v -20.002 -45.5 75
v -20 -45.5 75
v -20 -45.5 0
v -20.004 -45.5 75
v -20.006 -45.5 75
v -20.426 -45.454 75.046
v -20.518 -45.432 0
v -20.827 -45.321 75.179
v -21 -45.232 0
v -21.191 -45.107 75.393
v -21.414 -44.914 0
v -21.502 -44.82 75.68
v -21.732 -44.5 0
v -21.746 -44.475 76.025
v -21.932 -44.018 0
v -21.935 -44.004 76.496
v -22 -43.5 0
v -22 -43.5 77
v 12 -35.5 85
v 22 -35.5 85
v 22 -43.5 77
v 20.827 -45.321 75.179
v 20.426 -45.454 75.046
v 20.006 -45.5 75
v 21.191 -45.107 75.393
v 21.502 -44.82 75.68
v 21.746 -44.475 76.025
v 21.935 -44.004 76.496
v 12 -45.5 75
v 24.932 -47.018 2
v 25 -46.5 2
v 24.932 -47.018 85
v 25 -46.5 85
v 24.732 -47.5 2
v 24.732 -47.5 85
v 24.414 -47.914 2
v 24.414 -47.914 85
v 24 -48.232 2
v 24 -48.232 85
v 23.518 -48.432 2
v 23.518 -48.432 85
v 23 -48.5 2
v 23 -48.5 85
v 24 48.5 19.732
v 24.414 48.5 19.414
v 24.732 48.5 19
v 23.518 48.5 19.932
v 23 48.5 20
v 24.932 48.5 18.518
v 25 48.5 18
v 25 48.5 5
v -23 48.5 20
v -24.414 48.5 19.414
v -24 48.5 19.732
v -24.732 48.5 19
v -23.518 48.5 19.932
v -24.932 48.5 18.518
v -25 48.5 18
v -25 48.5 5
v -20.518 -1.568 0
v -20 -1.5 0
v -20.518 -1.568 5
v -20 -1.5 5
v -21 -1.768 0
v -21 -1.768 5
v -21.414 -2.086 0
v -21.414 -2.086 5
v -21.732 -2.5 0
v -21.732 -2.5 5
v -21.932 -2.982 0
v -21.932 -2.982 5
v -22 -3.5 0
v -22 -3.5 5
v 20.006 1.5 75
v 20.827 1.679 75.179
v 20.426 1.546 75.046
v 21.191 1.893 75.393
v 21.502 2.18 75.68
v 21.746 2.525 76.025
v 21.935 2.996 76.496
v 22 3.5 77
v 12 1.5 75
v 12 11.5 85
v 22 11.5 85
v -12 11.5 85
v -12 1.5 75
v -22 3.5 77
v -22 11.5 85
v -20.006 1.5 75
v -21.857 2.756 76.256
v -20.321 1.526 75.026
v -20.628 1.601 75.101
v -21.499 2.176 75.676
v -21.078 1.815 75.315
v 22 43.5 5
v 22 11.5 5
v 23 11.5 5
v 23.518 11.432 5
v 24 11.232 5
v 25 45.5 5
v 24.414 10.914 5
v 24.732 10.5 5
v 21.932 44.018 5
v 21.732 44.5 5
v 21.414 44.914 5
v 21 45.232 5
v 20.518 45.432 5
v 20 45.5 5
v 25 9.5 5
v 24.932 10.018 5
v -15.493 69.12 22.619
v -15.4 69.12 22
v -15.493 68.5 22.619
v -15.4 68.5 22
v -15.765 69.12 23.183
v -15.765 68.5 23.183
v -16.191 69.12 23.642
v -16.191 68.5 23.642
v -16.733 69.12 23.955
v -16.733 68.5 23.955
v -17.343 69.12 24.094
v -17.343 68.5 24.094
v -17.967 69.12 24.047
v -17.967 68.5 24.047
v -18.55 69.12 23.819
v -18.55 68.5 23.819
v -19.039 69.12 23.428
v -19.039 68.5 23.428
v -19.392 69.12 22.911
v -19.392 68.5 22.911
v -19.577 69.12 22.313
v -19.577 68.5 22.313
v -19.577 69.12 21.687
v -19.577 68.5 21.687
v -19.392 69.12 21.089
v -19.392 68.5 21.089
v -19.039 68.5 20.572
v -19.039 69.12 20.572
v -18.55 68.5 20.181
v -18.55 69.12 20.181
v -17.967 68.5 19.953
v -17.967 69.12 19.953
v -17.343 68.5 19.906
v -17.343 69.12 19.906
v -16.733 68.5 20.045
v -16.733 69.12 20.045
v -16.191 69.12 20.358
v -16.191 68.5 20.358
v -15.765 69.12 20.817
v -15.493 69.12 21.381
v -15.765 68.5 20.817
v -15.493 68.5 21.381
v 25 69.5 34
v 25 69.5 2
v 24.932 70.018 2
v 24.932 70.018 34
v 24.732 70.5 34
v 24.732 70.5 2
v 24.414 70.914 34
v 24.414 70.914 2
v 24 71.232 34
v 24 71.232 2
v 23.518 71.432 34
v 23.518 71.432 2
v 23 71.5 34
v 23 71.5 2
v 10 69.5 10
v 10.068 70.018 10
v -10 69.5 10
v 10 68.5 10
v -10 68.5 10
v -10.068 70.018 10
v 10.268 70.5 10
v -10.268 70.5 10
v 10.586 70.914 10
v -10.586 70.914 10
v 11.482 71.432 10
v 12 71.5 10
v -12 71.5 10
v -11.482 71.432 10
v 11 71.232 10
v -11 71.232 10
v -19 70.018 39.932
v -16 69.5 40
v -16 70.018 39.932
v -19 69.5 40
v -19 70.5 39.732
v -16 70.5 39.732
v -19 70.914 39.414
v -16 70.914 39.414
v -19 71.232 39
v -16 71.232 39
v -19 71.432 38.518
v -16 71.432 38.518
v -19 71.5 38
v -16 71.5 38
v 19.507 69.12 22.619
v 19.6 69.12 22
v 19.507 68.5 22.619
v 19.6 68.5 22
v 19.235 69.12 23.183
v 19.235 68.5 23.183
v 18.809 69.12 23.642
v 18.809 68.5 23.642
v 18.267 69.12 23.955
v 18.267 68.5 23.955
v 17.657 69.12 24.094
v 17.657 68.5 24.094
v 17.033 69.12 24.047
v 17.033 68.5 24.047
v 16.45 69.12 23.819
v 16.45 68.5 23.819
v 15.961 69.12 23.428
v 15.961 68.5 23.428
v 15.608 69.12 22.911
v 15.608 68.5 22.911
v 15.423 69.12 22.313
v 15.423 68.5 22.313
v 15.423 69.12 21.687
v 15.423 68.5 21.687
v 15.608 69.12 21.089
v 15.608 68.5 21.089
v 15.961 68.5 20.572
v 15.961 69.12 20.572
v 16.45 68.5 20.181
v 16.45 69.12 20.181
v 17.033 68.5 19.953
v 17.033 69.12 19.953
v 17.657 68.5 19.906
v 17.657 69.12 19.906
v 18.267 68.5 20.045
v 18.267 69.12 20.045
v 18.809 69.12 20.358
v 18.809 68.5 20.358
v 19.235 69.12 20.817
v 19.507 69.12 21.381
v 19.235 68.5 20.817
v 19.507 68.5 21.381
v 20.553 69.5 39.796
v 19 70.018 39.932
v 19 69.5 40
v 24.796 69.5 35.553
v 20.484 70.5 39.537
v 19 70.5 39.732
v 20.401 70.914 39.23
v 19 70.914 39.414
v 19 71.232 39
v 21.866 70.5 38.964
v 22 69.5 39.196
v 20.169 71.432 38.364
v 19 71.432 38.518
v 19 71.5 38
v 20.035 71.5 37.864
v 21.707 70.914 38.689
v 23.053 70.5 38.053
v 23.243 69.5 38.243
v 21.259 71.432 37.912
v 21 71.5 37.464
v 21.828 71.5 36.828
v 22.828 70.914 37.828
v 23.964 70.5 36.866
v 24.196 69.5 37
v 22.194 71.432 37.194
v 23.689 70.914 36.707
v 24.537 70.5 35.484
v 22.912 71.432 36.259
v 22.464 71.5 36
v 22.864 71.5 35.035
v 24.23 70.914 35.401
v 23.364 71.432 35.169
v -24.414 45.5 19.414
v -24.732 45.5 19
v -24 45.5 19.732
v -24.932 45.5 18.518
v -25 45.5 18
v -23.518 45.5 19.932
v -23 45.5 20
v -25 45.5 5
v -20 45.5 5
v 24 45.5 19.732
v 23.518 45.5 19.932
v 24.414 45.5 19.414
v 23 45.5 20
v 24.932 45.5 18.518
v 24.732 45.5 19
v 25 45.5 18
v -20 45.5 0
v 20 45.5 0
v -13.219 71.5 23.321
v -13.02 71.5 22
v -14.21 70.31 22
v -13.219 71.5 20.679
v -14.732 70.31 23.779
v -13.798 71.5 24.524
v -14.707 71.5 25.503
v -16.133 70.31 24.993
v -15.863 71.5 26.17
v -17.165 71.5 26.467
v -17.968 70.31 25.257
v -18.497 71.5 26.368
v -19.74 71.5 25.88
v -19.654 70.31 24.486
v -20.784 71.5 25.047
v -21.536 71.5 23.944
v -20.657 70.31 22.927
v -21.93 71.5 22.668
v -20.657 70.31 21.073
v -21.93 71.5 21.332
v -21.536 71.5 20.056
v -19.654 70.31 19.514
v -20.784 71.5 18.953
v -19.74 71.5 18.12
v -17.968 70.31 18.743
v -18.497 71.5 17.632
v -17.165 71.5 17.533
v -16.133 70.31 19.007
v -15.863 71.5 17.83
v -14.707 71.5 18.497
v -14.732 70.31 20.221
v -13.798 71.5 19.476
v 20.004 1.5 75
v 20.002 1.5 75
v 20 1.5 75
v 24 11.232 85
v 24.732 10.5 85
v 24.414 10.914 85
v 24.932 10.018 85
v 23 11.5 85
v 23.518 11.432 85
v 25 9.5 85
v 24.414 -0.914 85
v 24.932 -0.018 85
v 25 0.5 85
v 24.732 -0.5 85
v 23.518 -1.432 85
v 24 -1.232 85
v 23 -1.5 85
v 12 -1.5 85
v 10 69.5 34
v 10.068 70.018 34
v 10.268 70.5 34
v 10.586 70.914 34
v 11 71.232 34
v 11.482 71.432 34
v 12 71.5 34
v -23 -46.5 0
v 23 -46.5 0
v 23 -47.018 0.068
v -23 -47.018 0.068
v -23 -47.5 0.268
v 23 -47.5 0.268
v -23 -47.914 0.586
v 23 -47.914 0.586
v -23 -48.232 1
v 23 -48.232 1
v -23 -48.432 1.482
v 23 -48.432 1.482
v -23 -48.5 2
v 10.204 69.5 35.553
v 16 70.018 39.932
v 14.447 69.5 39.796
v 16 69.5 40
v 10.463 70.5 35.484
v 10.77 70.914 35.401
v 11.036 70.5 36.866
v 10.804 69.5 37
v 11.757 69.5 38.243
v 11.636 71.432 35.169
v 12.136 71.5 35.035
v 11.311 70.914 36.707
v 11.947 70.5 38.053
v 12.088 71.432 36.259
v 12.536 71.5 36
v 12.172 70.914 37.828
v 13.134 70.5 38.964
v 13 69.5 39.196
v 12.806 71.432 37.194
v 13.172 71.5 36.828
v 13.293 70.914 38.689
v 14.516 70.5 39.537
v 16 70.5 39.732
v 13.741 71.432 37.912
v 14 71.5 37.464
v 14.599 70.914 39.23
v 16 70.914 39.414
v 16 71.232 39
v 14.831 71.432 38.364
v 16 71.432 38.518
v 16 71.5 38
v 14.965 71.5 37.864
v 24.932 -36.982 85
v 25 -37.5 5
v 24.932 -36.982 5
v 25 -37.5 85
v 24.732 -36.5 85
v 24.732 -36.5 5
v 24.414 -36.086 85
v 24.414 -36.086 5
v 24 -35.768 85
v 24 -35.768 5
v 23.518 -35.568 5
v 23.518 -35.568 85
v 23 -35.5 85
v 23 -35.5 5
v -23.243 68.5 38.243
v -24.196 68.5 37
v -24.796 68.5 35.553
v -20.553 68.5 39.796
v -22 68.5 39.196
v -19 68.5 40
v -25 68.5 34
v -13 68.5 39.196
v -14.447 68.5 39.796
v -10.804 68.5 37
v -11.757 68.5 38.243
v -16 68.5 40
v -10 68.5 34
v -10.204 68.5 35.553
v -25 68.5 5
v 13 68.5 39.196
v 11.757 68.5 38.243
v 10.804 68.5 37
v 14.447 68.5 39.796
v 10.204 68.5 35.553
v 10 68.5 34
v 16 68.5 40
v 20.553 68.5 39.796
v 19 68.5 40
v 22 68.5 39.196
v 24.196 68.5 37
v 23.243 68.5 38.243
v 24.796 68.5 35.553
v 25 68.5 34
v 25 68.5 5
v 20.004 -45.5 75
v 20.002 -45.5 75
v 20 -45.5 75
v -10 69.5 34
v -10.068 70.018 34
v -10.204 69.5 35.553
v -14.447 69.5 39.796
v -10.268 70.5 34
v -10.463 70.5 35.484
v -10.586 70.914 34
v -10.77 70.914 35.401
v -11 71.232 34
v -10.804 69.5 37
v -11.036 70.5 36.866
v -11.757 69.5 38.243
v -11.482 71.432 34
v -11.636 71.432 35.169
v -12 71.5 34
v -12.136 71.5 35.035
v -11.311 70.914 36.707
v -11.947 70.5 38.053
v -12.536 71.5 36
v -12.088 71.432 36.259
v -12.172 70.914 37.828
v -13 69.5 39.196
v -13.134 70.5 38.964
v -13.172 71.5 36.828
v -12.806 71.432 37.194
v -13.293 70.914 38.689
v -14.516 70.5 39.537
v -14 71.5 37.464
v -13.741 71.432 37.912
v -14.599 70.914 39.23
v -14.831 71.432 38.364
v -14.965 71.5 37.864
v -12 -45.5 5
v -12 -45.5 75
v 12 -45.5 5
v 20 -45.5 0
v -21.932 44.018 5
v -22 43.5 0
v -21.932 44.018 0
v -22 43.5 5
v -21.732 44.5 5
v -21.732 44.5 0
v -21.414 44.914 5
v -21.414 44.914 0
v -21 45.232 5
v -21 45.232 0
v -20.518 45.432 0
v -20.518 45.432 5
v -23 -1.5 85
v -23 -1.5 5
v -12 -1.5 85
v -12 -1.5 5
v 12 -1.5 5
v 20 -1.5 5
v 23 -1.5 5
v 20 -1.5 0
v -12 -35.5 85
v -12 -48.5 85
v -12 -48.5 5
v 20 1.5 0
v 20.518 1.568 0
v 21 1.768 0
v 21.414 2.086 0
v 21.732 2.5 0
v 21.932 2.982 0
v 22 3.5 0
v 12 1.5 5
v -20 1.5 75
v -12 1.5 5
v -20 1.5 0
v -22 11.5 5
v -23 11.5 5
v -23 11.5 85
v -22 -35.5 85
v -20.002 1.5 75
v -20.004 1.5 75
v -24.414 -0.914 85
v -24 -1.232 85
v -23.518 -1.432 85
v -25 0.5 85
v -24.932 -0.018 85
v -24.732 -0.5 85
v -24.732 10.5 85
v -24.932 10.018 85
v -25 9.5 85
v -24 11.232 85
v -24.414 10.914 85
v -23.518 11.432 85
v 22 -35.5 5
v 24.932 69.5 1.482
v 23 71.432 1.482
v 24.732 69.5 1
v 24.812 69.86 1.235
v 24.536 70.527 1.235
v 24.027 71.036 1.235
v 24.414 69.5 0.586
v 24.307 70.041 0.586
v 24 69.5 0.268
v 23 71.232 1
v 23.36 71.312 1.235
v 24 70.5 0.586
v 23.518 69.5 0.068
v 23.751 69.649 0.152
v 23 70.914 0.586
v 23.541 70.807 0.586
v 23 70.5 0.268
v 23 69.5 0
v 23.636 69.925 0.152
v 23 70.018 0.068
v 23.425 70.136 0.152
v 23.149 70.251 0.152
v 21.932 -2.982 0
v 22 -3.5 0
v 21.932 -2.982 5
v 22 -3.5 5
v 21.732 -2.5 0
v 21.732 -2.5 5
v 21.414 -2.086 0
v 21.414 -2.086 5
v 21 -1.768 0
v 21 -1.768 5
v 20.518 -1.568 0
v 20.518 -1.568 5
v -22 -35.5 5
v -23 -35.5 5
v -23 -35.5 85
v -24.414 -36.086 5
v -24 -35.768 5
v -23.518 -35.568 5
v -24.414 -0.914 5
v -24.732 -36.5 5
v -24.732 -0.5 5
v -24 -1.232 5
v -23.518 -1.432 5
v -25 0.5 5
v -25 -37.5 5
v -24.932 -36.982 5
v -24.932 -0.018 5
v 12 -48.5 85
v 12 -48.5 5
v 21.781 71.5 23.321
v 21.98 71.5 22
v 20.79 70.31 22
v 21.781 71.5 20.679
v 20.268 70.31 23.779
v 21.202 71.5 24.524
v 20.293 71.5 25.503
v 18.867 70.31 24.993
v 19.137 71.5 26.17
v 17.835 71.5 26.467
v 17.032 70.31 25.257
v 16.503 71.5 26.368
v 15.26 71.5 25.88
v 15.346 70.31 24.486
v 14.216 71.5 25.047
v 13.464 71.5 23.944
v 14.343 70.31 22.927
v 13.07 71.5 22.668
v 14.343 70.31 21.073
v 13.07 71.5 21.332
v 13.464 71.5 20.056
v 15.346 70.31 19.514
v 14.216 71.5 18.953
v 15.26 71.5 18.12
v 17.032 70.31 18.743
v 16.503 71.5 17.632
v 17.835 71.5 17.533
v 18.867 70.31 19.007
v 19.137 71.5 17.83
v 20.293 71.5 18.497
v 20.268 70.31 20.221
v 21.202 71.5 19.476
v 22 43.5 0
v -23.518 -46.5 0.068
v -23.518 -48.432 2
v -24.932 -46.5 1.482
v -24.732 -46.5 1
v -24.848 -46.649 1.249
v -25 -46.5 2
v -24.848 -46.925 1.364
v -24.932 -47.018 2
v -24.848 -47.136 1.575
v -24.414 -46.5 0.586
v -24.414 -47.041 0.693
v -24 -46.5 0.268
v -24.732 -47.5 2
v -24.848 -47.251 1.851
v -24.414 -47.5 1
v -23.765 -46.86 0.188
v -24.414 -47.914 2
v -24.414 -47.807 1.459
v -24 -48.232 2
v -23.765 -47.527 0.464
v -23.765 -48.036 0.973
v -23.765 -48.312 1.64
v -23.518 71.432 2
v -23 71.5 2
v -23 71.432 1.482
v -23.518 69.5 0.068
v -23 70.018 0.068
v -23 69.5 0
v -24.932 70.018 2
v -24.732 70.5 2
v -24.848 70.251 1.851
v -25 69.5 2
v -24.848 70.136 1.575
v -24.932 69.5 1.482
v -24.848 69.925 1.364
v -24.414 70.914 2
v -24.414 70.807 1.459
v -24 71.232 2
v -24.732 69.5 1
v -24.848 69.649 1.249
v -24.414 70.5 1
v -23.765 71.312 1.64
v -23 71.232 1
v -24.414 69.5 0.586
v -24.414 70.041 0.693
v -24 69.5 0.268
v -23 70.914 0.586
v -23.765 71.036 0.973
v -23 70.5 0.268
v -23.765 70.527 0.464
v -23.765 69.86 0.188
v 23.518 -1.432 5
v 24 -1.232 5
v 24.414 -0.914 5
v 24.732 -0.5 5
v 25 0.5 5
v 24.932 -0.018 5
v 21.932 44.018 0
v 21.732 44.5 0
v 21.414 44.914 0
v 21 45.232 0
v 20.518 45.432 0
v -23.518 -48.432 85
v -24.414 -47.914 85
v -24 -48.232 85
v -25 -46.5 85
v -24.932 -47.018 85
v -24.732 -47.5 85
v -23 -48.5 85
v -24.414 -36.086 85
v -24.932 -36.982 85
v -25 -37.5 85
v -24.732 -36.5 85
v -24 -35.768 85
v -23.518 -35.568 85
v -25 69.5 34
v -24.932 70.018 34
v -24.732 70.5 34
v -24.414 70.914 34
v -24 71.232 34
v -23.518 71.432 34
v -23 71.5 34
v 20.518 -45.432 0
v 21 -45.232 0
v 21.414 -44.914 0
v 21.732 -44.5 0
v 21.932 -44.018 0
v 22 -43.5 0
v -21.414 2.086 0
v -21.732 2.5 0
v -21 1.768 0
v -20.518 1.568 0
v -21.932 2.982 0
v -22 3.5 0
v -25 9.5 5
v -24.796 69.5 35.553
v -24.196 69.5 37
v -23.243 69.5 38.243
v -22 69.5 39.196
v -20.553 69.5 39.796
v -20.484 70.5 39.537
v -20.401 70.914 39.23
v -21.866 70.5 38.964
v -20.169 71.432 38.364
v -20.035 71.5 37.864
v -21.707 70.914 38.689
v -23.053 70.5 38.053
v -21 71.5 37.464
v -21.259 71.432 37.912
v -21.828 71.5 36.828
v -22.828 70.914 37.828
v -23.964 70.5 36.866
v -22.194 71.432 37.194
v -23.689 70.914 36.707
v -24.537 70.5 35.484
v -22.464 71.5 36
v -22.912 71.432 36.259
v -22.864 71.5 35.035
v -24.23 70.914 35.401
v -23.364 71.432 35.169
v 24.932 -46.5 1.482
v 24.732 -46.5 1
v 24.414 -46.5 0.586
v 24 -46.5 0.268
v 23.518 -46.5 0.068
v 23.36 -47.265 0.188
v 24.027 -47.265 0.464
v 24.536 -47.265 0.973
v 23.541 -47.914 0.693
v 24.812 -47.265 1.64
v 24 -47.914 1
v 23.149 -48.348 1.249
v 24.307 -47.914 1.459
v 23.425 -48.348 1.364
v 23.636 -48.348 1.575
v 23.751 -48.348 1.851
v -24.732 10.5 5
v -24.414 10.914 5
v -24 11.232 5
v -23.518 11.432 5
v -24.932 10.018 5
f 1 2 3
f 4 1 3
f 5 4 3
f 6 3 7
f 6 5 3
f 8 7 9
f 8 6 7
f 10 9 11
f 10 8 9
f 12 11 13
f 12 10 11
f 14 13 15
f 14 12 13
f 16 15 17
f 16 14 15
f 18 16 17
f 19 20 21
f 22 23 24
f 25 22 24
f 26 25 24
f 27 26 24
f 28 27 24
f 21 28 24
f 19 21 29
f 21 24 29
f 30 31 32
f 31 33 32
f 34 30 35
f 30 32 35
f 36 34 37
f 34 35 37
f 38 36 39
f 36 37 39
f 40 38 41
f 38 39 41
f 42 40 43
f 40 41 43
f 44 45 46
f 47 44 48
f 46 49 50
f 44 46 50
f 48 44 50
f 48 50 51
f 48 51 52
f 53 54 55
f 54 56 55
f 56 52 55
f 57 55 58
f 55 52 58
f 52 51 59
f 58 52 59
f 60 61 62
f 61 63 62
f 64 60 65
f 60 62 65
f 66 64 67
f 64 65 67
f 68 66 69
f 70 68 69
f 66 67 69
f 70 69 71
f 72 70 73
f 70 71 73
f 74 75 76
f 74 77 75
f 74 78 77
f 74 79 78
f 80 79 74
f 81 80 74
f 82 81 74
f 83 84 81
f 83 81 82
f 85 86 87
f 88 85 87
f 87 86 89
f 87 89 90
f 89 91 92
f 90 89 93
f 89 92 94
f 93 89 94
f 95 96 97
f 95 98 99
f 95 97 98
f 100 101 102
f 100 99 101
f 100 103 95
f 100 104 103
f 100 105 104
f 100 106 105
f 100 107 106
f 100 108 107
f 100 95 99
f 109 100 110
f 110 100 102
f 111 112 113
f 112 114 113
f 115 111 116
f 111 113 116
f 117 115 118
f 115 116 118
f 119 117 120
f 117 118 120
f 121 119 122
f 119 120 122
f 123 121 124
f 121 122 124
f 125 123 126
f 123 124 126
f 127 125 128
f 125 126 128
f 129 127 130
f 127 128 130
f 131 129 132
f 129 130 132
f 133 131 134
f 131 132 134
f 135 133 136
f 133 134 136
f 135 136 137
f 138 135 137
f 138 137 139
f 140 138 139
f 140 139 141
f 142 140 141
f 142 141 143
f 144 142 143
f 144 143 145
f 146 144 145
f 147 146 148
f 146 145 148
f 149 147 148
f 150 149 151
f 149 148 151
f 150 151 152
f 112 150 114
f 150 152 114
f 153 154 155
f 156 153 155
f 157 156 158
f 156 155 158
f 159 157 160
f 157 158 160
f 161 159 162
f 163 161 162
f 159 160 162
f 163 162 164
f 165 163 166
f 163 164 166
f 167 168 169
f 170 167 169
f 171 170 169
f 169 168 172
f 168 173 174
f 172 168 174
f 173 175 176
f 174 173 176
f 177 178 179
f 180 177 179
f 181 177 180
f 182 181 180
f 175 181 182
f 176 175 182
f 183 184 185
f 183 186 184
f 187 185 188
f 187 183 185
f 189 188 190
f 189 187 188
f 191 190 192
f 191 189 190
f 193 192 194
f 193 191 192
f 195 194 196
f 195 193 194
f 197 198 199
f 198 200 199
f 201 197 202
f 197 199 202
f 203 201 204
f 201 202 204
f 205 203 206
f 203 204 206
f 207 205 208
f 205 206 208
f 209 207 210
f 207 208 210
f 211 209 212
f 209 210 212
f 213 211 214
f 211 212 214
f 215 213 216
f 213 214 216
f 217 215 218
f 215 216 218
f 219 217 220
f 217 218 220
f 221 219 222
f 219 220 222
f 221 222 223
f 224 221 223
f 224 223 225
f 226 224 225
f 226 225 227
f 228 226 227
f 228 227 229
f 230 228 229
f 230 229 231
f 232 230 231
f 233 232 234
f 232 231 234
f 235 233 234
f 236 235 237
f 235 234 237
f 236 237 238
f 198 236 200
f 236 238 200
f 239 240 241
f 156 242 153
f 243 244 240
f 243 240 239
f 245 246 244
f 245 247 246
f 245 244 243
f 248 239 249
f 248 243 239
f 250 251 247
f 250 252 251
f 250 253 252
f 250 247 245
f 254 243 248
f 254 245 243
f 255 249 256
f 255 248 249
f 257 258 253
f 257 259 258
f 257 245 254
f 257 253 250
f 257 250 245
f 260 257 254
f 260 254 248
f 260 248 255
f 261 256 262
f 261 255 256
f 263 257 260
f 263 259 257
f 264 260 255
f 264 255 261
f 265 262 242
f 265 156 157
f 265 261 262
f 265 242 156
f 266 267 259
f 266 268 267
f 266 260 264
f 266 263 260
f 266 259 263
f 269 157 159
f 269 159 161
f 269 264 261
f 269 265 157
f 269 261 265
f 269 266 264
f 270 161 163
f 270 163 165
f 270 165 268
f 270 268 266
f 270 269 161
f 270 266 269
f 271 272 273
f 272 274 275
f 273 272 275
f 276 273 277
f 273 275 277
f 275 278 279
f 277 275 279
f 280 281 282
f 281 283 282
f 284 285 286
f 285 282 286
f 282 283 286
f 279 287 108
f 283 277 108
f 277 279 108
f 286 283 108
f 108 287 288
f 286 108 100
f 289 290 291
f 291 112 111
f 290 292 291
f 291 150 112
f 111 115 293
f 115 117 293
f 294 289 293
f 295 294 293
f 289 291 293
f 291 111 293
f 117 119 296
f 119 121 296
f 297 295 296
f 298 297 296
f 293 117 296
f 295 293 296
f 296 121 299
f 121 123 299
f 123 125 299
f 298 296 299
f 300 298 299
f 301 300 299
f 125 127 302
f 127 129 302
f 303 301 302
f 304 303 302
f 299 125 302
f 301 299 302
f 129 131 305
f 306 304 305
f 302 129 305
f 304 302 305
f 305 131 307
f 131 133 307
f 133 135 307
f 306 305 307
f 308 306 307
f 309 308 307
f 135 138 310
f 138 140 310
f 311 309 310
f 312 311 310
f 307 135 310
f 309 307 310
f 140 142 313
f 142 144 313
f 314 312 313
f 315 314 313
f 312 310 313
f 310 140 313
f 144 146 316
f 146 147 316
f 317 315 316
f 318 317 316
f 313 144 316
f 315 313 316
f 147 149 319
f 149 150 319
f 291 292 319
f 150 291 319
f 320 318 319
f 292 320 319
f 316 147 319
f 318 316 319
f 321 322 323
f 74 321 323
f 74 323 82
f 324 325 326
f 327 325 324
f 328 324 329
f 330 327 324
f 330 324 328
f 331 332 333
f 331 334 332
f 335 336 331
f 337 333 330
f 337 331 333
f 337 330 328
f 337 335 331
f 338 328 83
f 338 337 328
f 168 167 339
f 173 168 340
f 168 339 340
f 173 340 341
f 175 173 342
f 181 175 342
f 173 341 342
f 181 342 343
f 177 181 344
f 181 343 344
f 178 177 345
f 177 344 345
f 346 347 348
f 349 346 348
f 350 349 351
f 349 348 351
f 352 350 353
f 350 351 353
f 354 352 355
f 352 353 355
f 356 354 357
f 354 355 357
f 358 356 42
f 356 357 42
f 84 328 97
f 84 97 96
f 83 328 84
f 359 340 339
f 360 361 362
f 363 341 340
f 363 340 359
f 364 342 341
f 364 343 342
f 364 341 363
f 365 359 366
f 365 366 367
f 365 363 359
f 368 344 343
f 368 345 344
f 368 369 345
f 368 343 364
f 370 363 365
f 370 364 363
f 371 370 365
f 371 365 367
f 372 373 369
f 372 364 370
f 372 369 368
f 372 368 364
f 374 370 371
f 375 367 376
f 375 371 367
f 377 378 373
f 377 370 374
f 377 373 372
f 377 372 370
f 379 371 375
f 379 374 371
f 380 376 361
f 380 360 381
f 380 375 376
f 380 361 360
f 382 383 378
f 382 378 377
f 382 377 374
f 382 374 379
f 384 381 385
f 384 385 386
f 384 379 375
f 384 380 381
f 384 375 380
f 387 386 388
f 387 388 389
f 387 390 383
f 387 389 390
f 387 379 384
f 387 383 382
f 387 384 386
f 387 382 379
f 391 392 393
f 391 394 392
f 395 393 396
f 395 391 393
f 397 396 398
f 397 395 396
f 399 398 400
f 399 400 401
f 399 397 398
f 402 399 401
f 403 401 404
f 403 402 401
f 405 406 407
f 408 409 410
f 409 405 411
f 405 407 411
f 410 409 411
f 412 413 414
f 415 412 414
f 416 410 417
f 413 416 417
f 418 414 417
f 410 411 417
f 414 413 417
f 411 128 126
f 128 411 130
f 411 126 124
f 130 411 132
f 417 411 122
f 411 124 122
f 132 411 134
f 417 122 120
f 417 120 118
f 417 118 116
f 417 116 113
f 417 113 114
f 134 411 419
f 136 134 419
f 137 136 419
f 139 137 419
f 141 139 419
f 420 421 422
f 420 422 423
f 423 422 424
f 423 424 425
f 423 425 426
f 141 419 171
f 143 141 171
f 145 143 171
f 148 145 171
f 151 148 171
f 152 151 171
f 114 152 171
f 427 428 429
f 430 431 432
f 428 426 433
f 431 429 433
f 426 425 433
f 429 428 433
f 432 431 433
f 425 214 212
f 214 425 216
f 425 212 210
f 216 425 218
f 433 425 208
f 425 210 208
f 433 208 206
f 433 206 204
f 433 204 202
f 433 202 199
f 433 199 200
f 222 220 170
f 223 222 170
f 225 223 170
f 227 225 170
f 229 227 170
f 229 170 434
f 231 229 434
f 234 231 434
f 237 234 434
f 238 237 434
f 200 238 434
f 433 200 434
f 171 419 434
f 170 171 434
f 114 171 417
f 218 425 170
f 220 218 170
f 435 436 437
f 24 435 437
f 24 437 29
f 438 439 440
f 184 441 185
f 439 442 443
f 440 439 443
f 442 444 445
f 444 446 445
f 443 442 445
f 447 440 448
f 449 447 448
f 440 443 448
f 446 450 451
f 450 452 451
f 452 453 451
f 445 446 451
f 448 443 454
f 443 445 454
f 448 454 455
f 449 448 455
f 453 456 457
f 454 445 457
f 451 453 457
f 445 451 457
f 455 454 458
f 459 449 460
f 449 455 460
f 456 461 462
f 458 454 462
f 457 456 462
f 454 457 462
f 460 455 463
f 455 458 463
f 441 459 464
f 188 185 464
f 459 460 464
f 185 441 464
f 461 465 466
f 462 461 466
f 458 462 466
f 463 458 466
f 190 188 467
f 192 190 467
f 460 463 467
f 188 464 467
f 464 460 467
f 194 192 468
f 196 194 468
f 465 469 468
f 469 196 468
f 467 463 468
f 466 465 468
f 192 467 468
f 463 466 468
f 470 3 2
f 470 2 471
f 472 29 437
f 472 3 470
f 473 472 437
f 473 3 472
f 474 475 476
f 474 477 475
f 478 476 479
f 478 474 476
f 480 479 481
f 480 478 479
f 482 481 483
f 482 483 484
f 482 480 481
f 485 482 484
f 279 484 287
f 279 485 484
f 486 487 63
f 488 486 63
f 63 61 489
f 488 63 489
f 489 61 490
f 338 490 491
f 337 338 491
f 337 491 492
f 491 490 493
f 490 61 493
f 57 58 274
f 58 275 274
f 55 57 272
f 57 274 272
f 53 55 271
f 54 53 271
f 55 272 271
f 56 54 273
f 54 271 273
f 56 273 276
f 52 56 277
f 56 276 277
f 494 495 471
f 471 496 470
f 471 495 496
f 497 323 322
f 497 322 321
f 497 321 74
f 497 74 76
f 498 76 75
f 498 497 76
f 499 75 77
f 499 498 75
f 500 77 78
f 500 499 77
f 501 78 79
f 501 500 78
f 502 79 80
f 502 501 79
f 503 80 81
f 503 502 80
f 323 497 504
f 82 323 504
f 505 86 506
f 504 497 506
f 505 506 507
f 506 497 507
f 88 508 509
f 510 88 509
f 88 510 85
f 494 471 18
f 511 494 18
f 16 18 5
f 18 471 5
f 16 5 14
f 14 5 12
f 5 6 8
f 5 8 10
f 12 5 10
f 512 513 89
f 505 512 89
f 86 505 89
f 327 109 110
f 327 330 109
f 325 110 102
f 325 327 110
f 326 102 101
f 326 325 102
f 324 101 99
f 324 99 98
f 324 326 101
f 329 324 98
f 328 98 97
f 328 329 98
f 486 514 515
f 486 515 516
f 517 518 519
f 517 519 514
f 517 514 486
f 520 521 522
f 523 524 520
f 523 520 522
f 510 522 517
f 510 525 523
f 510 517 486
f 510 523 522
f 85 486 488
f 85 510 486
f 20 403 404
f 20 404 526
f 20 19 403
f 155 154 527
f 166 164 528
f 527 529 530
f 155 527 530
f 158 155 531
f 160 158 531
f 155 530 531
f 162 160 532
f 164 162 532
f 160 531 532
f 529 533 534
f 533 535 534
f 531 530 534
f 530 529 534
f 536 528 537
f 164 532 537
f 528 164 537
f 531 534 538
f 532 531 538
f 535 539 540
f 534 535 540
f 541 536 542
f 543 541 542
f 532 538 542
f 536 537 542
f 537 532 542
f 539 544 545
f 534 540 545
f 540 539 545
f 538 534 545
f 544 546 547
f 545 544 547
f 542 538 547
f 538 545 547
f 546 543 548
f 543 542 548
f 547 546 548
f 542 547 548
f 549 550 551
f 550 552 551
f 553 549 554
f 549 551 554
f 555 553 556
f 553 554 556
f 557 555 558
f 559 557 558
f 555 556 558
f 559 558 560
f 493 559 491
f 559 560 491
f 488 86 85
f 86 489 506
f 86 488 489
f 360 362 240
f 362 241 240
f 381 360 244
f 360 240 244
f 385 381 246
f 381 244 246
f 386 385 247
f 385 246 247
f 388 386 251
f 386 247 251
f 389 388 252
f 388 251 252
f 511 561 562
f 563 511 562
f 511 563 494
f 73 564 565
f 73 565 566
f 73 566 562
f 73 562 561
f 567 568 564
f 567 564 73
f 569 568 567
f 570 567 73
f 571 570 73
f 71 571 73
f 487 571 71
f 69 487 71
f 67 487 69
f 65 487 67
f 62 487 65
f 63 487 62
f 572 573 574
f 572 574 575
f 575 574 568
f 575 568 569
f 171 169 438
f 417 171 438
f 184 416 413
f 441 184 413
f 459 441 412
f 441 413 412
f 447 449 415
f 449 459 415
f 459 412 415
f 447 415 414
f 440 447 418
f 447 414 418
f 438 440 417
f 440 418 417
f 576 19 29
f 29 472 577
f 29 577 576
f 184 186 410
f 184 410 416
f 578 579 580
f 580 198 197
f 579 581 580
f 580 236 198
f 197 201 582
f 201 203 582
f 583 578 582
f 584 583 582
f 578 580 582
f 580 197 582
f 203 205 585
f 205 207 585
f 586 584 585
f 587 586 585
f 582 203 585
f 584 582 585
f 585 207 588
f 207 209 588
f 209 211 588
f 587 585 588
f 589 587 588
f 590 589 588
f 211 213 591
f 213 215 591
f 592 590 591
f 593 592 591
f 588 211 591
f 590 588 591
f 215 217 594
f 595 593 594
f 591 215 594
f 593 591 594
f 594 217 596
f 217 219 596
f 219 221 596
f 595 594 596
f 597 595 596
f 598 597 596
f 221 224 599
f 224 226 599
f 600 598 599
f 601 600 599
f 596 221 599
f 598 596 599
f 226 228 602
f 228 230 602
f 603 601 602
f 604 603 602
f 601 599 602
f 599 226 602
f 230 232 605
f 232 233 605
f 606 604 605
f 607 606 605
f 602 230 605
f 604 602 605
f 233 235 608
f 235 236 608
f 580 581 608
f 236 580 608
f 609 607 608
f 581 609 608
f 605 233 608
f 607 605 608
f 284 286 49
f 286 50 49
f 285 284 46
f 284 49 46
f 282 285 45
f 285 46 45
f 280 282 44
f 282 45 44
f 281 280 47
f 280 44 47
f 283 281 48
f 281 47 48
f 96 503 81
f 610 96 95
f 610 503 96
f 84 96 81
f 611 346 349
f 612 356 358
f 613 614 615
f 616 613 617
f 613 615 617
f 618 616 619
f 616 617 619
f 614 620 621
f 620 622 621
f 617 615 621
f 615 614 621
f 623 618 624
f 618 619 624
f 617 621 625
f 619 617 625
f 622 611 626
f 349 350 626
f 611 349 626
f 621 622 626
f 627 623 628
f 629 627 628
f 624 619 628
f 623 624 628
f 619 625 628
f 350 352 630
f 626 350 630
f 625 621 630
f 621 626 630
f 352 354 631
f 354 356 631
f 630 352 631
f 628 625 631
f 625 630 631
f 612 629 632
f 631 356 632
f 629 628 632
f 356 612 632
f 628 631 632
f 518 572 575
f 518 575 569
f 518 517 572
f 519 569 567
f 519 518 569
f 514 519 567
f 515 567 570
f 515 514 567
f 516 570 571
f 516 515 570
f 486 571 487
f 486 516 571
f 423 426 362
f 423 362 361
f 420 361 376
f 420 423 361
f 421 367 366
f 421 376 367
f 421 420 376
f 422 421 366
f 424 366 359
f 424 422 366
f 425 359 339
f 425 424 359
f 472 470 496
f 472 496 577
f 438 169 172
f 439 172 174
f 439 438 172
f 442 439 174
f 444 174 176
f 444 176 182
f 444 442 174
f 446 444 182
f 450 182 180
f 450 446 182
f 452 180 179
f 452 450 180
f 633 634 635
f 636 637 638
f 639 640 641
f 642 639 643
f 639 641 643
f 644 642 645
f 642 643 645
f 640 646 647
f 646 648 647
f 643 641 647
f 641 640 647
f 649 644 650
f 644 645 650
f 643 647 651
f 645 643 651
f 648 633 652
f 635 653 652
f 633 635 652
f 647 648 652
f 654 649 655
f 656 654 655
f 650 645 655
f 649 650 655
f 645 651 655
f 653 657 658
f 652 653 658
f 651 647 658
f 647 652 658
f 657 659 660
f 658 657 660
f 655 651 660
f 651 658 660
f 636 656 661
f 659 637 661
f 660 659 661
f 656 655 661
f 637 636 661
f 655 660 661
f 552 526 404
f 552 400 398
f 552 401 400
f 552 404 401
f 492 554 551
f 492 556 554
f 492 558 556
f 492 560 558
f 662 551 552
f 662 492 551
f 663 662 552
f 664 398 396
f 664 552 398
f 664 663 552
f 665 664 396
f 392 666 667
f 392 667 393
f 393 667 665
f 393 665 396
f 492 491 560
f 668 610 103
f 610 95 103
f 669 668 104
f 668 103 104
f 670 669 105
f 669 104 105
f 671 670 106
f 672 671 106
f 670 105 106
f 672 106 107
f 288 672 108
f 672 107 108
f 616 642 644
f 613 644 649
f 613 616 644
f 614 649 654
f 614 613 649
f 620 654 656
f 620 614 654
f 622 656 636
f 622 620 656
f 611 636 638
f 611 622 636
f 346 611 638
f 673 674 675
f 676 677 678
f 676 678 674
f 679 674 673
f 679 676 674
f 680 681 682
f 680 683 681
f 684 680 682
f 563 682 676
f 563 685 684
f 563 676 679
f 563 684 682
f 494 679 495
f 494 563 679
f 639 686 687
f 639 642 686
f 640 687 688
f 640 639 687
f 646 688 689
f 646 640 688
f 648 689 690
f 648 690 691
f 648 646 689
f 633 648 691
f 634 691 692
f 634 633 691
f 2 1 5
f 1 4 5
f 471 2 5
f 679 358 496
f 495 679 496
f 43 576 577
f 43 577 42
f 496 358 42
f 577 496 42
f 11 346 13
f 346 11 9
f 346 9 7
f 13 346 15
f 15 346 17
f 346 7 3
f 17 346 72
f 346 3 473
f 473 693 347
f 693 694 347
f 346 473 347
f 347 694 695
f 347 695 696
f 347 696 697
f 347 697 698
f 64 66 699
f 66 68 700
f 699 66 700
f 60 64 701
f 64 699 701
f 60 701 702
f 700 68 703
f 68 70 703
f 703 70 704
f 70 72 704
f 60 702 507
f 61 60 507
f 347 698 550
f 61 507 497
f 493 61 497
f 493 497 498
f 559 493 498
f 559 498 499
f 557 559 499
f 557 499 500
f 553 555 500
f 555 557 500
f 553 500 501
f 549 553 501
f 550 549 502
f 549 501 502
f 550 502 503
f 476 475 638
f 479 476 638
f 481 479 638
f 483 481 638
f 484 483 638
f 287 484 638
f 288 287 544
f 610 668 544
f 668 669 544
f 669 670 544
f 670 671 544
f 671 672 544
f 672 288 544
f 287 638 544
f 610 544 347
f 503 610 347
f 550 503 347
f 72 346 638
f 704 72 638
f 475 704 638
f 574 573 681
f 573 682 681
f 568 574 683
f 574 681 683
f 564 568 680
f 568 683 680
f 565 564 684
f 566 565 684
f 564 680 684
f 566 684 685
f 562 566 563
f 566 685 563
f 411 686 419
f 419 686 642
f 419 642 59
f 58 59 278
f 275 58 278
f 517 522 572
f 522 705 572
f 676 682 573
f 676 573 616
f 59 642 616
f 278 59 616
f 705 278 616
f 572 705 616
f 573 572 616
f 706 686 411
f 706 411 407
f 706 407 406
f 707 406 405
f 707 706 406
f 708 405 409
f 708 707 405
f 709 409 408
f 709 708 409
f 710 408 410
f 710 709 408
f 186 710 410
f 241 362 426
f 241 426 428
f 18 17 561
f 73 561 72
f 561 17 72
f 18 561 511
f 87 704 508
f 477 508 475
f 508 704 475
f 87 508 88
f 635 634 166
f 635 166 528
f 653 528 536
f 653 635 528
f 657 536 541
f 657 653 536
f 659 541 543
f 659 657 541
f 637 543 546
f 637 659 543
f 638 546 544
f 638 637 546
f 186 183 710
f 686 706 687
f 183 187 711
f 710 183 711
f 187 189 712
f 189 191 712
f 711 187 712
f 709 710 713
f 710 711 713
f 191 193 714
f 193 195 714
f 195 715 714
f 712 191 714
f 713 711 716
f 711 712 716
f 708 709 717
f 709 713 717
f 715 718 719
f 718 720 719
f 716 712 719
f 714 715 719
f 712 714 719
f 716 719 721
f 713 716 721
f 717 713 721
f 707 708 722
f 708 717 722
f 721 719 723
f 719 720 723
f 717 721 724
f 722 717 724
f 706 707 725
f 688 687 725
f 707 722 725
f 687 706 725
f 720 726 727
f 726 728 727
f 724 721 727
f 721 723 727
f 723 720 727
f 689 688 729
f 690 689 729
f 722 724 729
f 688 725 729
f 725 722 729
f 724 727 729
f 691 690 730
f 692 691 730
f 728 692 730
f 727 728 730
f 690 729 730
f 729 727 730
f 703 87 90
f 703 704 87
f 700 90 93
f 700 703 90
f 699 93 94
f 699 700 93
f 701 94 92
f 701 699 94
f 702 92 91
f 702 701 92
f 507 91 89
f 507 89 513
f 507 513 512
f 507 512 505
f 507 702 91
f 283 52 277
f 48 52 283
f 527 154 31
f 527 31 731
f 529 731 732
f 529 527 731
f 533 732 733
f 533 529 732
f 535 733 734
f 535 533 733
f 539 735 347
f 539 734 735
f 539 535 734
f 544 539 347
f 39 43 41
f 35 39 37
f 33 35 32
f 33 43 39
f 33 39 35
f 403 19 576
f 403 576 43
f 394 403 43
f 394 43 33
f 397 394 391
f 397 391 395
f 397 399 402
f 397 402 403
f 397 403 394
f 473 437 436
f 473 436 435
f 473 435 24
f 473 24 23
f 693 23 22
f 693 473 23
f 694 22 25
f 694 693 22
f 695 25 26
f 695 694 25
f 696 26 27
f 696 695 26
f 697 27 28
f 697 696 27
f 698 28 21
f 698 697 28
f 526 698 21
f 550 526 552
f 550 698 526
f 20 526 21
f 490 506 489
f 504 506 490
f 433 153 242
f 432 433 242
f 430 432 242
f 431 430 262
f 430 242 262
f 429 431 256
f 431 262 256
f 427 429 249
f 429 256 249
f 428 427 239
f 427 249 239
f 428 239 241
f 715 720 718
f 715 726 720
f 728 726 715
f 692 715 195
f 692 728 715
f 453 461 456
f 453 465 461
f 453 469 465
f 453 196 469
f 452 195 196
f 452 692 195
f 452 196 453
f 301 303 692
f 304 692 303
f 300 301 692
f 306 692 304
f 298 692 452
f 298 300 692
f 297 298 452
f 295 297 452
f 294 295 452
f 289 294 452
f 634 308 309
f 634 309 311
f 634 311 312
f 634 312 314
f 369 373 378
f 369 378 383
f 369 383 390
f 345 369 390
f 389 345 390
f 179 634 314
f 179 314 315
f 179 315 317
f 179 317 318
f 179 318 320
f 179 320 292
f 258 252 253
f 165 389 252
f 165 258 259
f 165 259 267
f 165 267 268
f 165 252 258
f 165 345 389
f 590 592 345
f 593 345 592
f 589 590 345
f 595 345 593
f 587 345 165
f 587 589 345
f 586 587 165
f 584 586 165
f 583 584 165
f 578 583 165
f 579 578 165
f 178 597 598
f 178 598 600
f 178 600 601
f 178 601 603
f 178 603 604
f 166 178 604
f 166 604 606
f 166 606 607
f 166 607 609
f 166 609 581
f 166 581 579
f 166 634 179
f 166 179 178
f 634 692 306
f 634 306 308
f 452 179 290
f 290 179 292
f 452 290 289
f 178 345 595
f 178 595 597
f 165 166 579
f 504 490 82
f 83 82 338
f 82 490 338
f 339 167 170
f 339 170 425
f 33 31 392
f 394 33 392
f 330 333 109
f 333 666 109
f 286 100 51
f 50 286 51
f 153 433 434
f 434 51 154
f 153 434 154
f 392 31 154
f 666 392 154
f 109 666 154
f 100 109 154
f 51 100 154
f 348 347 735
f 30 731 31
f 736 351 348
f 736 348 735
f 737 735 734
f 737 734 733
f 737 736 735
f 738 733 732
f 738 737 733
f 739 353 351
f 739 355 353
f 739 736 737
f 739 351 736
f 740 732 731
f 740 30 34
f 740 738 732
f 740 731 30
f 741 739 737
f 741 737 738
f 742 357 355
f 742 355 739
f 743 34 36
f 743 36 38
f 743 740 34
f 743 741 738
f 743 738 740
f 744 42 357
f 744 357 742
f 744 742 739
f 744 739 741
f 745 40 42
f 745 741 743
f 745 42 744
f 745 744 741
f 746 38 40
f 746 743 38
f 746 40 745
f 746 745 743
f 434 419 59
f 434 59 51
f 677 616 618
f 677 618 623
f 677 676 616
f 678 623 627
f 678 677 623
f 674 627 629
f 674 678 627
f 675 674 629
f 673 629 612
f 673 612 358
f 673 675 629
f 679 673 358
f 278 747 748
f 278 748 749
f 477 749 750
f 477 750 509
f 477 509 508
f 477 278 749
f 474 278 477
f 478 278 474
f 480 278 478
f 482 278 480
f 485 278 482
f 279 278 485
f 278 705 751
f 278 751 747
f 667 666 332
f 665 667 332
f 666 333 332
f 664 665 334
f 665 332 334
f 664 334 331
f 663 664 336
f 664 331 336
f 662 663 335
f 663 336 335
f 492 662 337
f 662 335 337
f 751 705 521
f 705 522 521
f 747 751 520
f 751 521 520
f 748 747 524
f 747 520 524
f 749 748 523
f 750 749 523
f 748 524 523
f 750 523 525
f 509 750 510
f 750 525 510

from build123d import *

# Parameters (mm, degrees)
F0_W            = 50
F0_H            = 120
F0_W_2          = 44
F0_H_2          = 44
F1_DEPTH        = 5
F2_W            = 50
F2_H            = 3
F3_DEPTH        = 35
F4_DEPTH        = 15
F5_DEPTH        = 80
F6_W            = 10
F6_H            = 10
F7_W            = 10
F7_H            = 10
F8_DEPTH        = 10
F9_SIZE         = 9.99999
F10_W           = 20
F10_H           = 30
F11_DEPTH       = 3
F12_R           = 6
F13_F1_R        = 2
F13_F2_R        = 2
F13_F3_R        = 2
F13_F4_R        = 2
F13_F5_R        = 2
F13_F6_R        = 2
F13_F7_R        = 2
F13_F8_R        = 2
F13_F9_R        = 2
F13_F10_R       = 2
F13_F11_R       = 2
F13_F12_R       = 2
F13_F13_R       = 2
F13_F14_R       = 2
F13_F15_R       = 2
F13_F16_R       = 2
F13_F17_R       = 2
F13_F18_R       = 2
F13_F19_R       = 2
F13_F20_R       = 2
F15_D           = 4.2
F15_DEPTH       = 12
F15_CSINK_D     = 8.96
F15_CSINK_ANGLE = 90
F15_TIP         = 1.2618073


# Not quite as in the source:
# - a fillet or chamfer is up to 0.001 mm smaller than in the source, because OpenCascade refuses the exact size


with BuildPart() as f1:
    # F0 (on Top) → F1 (new body)
    with BuildSketch(Plane.XY):
        with Locations((0, 11.5)):
            Rectangle(F0_W, F0_H)
        with Locations((0, -23.5)):
            Rectangle(F0_W_2, F0_H_2, mode=Mode.SUBTRACT)
        with Locations((0, 23.5)):
            Rectangle(F0_W_2, F0_H_2, mode=Mode.SUBTRACT)
    extrude(amount=F1_DEPTH)

    # F2 (on face) → F3 (join)
    with BuildSketch(Plane.XY.offset(5)):
        with Locations((0, 70)):
            Rectangle(F2_W, F2_H)
    extrude(amount=F3_DEPTH)

    # F2 (on face) → F4 (join)
    with BuildSketch(Plane.XY.offset(5)):
        Polygon((25, 48.5), (-25, 48.5), (-25, 45.5), (-22, 45.5), (22, 45.5), (25, 45.5), align=None)
    extrude(amount=F4_DEPTH)

    # F2 (on face) → F5 (join)
    with BuildSketch(Plane.XY.offset(5)):
        Polygon((-22, 11.5), (-25, 11.5), (-25, -1.5), (-22, -1.5), (-12, -1.5), (-12, 1.5), (-22, 1.5), align=None)
        Polygon((25, -1.5), (25, 11.5), (22, 11.5), (22, 1.5), (12, 1.5), (12, -1.5), (22, -1.5), align=None)
        Polygon((-22, -35.5), (-25, -35.5), (-25, -48.5), (-12, -48.5), (-12, -45.5), (-22, -45.5), align=None)
        Polygon((25, -48.5), (25, -35.5), (22, -35.5), (22, -45.5), (12, -45.5), (12, -48.5), align=None)
    extrude(amount=F5_DEPTH)

    # F6 (on face) + F7 (on face) → F8 (join)
    with BuildSketch(Plane(origin=(0, 1.5, 0), x_dir=(-1, 0, 0), z_dir=(0, 1, 0))):
        with Locations((-17, 80)):
            Rectangle(F6_W, F6_H)
        with Locations((17, 80)):
            Rectangle(F6_W, F6_H)
    with BuildSketch(Plane(origin=(0, -45.5, 0), x_dir=(-1, 0, 0), z_dir=(0, 1, 0))):
        with Locations((17, 80)):
            Rectangle(F7_W, F7_H)
        with Locations((-17, 80)):
            Rectangle(F7_W, F7_H)
    extrude(amount=F8_DEPTH)

    # F9 (size 10 in the source; OpenCascade refuses exactly that, so slightly less here)
    f9_edges = [f1.edges().sort_by_distance(p)[0] for p in [
        (-17, 11.5, 75),
        (-17, -35.5, 75),
        (17, 11.5, 75),
        (17, -35.5, 75),
    ]]
    chamfer(f9_edges, length=F9_SIZE)

    # F10 (on face) → F11 (cut, through all)
    with BuildSketch(Plane(origin=(0, 71.5, 0), x_dir=(-1, 0, 0), z_dir=(0, 1, 0))):
        with Locations((0, 25)):
            Rectangle(F10_W, F10_H)
    extrude(amount=-F11_DEPTH, mode=Mode.SUBTRACT)

    # F12
    f12_edges = [f1.edges().sort_by_distance(p)[0] for p in [
        (25, 70, 40),
        (10, 70, 40),
        (-10, 70, 40),
        (-25, 70, 40),
    ]]
    fillet(f12_edges, radius=F12_R)

    # F13: fillet of radius 2 on 36 edges, made by hand

    # F13_f1
    f13_f1_edges = [f1.edges().sort_by_distance(p)[0] for p in [
        (25, 71.5, 17),
        (23.2426406871, 71.5, 38.2426406871),
        (17.5, 71.5, 40),
        (11.7573593129, 71.5, 38.2426406871),
        (10, 71.5, 22),
    ]]
    fillet(f13_f1_edges, radius=F13_F1_R)

    # F13_f2
    f13_f2_edges = [f1.edges().sort_by_distance(p)[0] for p in [
        (25, 10.5, 0),
    ]]
    fillet(f13_f2_edges, radius=F13_F2_R)

    # F13_f3
    f13_f3_edges = [f1.edges().sort_by_distance(p)[0] for p in [
        (25, 47, 20),
    ]]
    fillet(f13_f3_edges, radius=F13_F3_R)

    # F13_f4
    f13_f4_edges = [f1.edges().sort_by_distance(p)[0] for p in [
        (25, -48.5, 43.5),
    ]]
    fillet(f13_f4_edges, radius=F13_F4_R)

    # F13_f5
    f13_f5_edges = [f1.edges().sort_by_distance(p)[0] for p in [
        (25, -35.5, 45),
    ]]
    fillet(f13_f5_edges, radius=F13_F5_R)

    # F13_f6
    f13_f6_edges = [f1.edges().sort_by_distance(p)[0] for p in [
        (25, 11.5, 45),
    ]]
    fillet(f13_f6_edges, radius=F13_F6_R)

    # F13_f7
    f13_f7_edges = [f1.edges().sort_by_distance(p)[0] for p in [
        (25, -1.5, 45),
    ]]
    fillet(f13_f7_edges, radius=F13_F7_R)

    # F13_f8
    f13_f8_edges = [f1.edges().sort_by_distance(p)[0] for p in [
        (-25, 71.5, 18),
        (-23.2426406871, 71.5, 38.2426406871),
        (-17.5, 71.5, 40),
        (-11.7573593129, 71.5, 38.2426406871),
        (-10, 71.5, 22),
    ]]
    fillet(f13_f8_edges, radius=F13_F8_R)

    # F13_f9
    f13_f9_edges = [f1.edges().sort_by_distance(p)[0] for p in [
        (-25, -35.5, 45),
    ]]
    fillet(f13_f9_edges, radius=F13_F9_R)

    # F13_f10
    f13_f10_edges = [f1.edges().sort_by_distance(p)[0] for p in [
        (-25, 47, 20),
    ]]
    fillet(f13_f10_edges, radius=F13_F10_R)

    # F13_f11
    f13_f11_edges = [f1.edges().sort_by_distance(p)[0] for p in [
        (-25, -1.5, 45),
    ]]
    fillet(f13_f11_edges, radius=F13_F11_R)

    # F13_f12
    f13_f12_edges = [f1.edges().sort_by_distance(p)[0] for p in [
        (-25, 11.5, 45),
    ]]
    fillet(f13_f12_edges, radius=F13_F12_R)

    # F13_f13
    f13_f13_edges = [f1.edges().sort_by_distance(p)[0] for p in [
        (-22, 45.5, 2.5),
    ]]
    fillet(f13_f13_edges, radius=F13_F13_R)

    # F13_f14
    f13_f14_edges = [f1.edges().sort_by_distance(p)[0] for p in [
        (22, 45.5, 2.5),
    ]]
    fillet(f13_f14_edges, radius=F13_F14_R)

    # F13_f15
    f13_f15_edges = [f1.edges().sort_by_distance(p)[0] for p in [
        (-22, -1.5, 2.5),
    ]]
    fillet(f13_f15_edges, radius=F13_F15_R)

    # F13_f16
    f13_f16_edges = [f1.edges().sort_by_distance(p)[0] for p in [
        (22, -1.5, 2.5),
    ]]
    fillet(f13_f16_edges, radius=F13_F16_R)

    # F13_f17
    f13_f17_edges = [f1.edges().sort_by_distance(p)[0] for p in [
        (-22, -45.5, 37.5),
    ]]
    fillet(f13_f17_edges, radius=F13_F17_R)

    # F13_f18
    f13_f18_edges = [f1.edges().sort_by_distance(p)[0] for p in [
        (22, -45.5, 37.5),
    ]]
    fillet(f13_f18_edges, radius=F13_F18_R)

    # F13_f19
    f13_f19_edges = [f1.edges().sort_by_distance(p)[0] for p in [
        (-22, 1.5, 37.5),
    ]]
    fillet(f13_f19_edges, radius=F13_F19_R)

    # F13_f20
    f13_f20_edges = [f1.edges().sort_by_distance(p)[0] for p in [
        (22, 1.5, 37.5),
    ]]
    fillet(f13_f20_edges, radius=F13_F20_R)

    # F15
    with Locations(Plane(origin=(0, 71.5, 0), x_dir=(-1, 0, 0), z_dir=(0, 1, 0))):
        with Locations((-17.5, 22), (17.5, 22)):
            CounterSinkHole(F15_D / 2, F15_CSINK_D / 2, depth=F15_DEPTH, counter_sink_angle=F15_CSINK_ANGLE)
            with Locations((0, 0, -(F15_DEPTH + F15_TIP / 2))):  # 118° drill point
                Cone(0, F15_D / 2, F15_TIP, mode=Mode.SUBTRACT)


solid = f1.part
